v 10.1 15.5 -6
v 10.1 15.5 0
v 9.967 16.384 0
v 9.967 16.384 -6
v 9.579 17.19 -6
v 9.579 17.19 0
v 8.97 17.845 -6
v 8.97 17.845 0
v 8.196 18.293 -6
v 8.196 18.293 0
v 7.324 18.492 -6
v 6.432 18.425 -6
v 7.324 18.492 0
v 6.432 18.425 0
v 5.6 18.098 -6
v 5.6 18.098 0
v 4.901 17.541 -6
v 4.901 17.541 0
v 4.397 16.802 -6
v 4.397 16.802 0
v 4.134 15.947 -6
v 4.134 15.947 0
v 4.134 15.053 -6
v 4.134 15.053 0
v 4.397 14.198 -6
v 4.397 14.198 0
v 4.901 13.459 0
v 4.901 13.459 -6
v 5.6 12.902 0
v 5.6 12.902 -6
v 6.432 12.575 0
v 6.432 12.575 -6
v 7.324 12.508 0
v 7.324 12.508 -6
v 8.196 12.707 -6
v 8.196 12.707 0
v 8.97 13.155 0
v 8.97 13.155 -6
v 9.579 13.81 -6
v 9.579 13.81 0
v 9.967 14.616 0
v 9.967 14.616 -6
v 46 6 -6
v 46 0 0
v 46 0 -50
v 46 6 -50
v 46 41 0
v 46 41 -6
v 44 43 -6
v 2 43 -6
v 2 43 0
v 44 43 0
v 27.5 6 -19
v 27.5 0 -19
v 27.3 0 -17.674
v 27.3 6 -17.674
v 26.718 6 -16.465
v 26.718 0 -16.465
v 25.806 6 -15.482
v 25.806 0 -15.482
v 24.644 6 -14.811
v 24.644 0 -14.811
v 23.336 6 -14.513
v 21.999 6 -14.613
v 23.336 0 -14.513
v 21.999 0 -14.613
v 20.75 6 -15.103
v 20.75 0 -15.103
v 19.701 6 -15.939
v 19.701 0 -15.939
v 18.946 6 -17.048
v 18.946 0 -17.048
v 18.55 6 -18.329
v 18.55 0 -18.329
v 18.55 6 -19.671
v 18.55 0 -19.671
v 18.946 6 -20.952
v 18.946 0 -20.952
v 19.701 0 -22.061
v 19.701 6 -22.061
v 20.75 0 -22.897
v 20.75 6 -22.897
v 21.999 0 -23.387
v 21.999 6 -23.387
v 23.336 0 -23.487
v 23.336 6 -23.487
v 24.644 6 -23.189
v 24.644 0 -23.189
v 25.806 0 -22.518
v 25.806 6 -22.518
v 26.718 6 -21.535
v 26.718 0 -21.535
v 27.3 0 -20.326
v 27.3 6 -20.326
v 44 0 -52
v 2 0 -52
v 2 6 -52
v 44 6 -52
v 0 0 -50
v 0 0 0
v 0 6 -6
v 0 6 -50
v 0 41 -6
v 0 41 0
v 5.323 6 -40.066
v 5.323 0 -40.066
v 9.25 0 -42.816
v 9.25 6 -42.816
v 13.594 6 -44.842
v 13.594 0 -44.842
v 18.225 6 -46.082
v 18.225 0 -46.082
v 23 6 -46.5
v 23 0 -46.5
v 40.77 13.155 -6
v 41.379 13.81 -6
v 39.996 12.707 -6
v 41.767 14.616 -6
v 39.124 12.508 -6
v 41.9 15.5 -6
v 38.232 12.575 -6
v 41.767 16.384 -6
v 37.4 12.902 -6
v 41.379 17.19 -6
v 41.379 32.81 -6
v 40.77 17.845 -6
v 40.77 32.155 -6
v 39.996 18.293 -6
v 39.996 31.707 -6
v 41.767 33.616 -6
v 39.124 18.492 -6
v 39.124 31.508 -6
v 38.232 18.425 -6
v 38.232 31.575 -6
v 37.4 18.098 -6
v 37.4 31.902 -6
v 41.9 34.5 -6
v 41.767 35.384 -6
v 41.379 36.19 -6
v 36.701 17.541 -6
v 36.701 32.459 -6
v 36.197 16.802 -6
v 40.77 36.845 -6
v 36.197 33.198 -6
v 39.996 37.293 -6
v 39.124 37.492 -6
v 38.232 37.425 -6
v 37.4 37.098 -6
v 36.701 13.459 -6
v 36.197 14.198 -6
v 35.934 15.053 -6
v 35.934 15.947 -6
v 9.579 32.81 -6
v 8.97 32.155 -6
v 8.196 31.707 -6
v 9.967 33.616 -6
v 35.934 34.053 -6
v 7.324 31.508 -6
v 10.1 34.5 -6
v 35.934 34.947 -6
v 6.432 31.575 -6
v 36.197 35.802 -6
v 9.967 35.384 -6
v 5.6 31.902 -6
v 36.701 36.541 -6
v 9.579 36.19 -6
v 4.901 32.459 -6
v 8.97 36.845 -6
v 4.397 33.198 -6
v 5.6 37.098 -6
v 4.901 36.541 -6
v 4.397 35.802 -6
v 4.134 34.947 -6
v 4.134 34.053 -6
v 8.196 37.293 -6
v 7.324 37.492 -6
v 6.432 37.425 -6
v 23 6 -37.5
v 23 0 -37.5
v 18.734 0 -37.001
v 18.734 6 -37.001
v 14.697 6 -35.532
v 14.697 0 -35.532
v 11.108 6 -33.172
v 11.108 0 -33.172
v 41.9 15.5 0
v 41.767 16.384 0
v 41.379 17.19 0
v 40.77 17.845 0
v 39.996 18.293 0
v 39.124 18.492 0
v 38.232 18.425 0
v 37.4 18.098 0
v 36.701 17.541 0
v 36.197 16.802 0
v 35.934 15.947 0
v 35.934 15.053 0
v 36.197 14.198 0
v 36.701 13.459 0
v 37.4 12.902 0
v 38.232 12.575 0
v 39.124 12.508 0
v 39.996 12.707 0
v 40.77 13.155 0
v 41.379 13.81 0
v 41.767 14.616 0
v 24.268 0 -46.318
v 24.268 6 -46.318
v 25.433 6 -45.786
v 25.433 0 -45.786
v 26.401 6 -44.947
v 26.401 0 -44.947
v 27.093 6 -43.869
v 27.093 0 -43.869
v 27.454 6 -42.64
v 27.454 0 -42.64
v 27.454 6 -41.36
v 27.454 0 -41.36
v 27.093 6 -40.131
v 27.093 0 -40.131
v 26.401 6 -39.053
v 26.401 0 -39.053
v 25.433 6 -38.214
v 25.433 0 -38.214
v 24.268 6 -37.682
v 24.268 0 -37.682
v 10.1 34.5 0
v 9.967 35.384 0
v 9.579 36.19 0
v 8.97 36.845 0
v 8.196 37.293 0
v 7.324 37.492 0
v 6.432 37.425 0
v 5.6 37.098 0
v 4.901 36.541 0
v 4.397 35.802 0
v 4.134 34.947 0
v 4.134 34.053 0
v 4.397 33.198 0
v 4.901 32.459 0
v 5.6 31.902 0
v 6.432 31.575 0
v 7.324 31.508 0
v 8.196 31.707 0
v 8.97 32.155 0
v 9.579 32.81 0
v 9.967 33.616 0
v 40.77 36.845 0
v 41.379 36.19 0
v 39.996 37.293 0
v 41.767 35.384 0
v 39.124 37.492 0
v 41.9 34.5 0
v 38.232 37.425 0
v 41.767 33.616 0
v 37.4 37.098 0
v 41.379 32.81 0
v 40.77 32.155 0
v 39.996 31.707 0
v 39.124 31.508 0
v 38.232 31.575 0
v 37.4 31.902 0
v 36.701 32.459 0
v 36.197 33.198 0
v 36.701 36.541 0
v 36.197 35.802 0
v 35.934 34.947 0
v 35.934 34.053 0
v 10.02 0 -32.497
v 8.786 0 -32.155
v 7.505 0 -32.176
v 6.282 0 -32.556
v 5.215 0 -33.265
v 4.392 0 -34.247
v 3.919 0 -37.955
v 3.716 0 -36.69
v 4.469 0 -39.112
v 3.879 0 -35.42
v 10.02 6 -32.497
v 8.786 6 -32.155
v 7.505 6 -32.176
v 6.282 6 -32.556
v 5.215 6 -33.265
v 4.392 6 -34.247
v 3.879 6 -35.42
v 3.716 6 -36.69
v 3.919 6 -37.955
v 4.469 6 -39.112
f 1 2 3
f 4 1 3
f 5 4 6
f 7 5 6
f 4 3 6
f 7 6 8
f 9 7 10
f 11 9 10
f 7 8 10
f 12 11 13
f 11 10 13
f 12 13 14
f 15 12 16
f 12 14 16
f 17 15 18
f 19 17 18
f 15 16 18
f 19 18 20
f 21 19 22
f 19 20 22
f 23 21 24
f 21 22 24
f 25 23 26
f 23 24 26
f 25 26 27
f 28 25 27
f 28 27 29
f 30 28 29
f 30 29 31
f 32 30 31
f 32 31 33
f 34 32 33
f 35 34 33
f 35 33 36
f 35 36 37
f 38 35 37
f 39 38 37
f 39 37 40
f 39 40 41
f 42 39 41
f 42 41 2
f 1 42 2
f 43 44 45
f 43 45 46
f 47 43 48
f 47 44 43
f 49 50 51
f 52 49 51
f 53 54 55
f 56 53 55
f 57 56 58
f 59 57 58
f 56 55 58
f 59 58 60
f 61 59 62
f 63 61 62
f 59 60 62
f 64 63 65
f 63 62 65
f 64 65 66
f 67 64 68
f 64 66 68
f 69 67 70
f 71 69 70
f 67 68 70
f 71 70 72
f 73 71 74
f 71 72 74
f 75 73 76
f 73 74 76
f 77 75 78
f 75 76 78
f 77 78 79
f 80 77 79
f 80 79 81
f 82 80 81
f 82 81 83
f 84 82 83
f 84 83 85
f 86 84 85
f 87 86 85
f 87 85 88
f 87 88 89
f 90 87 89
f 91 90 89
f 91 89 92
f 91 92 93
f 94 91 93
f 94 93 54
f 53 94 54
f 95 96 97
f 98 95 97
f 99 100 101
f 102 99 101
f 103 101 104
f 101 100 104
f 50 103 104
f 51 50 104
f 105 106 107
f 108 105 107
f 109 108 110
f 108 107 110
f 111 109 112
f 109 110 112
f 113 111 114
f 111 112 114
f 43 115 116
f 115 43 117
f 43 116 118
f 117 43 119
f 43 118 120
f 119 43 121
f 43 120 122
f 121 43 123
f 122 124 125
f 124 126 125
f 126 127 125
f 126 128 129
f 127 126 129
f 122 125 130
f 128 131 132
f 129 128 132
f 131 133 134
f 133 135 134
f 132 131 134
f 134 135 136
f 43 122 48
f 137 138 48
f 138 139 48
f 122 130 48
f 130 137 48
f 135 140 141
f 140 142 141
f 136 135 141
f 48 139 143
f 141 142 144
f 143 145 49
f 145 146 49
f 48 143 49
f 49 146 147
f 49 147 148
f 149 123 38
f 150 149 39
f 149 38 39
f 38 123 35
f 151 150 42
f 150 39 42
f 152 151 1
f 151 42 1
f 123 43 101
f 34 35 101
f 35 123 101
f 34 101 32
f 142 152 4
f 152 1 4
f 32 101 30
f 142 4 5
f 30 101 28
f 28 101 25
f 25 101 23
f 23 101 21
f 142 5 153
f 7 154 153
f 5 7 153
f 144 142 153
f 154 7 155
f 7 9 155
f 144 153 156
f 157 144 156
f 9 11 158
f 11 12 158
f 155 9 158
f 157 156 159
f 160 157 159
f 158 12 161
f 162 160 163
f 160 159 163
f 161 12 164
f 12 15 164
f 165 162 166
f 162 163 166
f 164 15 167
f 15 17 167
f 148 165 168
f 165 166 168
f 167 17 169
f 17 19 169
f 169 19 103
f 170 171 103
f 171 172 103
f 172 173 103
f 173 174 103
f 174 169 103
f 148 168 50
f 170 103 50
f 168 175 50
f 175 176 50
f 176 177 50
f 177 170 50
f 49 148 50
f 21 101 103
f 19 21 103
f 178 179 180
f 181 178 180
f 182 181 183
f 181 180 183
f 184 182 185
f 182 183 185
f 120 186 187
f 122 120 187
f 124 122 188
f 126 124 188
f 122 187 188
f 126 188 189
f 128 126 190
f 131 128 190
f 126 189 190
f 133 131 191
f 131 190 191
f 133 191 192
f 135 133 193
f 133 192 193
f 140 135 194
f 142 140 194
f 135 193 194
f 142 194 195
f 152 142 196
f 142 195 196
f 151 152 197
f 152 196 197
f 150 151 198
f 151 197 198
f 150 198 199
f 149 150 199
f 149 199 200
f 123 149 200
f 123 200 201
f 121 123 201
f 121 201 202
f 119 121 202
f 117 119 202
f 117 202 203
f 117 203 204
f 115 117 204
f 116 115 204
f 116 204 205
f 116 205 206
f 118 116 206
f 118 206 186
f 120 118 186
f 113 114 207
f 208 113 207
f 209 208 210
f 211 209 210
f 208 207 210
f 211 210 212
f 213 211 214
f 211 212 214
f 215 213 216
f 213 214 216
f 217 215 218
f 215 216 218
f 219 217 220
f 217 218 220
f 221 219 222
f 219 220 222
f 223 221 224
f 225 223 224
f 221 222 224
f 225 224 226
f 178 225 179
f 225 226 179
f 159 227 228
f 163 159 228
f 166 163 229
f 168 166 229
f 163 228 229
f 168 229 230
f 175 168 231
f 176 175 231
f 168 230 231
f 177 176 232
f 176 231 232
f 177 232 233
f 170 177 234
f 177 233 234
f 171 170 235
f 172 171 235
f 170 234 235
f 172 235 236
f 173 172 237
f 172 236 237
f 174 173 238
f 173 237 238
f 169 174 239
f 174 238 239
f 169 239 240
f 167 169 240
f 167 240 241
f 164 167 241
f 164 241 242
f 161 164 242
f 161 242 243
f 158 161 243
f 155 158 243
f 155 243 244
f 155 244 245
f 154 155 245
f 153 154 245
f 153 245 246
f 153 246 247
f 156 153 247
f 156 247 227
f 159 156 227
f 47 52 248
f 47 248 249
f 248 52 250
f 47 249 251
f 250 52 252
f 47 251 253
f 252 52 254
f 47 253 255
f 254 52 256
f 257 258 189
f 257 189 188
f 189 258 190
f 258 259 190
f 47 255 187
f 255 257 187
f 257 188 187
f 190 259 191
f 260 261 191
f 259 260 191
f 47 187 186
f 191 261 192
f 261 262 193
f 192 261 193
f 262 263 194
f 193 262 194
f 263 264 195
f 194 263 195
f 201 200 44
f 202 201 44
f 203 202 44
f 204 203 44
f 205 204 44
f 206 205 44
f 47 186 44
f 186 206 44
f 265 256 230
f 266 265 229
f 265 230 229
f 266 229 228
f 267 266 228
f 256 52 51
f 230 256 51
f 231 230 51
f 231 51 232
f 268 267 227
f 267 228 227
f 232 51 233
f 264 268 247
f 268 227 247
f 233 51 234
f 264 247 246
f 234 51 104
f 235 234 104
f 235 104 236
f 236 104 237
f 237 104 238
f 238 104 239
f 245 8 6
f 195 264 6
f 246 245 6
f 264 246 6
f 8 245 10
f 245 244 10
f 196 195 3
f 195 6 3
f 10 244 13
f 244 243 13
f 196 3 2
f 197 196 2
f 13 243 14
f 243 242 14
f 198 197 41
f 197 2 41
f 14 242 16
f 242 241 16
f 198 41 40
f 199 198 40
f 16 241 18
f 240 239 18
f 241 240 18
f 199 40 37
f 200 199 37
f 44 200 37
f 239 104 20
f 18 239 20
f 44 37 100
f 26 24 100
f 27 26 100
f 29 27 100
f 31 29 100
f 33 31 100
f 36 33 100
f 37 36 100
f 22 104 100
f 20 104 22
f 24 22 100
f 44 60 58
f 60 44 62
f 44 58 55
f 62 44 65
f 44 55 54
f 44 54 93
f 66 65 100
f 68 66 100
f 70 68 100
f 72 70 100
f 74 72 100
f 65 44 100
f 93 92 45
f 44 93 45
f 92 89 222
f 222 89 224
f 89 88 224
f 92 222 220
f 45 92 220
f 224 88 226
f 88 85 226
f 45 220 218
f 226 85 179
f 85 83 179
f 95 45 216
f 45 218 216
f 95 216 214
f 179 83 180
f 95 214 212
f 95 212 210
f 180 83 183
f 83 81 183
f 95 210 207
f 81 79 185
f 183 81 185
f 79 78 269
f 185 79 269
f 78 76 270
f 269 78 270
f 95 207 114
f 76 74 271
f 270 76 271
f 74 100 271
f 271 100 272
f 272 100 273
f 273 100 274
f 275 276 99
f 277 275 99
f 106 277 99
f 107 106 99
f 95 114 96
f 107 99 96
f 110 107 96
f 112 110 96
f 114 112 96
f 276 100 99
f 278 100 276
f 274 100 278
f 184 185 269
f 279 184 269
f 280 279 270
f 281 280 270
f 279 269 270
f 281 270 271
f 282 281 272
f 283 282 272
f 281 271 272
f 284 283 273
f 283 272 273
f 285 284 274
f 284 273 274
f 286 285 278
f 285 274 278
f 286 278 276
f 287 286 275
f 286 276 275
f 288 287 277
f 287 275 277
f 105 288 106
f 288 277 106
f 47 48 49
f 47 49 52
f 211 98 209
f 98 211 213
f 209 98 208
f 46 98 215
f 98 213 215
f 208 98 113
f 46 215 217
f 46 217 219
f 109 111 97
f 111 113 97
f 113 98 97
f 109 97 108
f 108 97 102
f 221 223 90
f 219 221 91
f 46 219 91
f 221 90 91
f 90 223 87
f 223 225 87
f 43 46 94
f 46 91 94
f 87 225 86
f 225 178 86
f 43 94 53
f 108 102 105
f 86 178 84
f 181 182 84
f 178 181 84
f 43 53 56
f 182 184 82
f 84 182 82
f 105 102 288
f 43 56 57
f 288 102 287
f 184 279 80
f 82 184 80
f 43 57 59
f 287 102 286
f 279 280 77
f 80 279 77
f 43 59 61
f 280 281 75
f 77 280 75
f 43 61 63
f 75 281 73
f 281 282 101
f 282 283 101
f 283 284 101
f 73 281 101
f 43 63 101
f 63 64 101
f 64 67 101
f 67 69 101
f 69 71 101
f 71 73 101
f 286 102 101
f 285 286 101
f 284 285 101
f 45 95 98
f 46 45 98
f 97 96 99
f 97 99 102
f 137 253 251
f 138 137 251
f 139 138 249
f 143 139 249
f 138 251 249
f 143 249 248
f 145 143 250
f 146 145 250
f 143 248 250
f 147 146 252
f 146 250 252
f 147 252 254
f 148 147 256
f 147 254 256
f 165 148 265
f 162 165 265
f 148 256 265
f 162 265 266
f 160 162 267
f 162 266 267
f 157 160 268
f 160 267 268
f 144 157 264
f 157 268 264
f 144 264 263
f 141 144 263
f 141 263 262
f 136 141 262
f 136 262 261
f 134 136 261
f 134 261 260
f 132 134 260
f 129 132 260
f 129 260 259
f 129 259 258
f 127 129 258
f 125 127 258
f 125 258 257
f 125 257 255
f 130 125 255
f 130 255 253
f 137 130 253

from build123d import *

# Parameters (mm, degrees)
F1_DEPTH = 46
F2_R     = 3
F3_DEPTH = 25
F4_R     = 4.5
F5_DEPTH = 25
F6_SIZE  = 2


with BuildPart() as f1:
    # F0 (on Right) → F1 (new body)
    with BuildSketch(Plane.YZ):
        Polygon((43, 0), (0, 0), (0, -52), (6, -52), (6, -6), (43, -6), align=None)
    extrude(amount=F1_DEPTH)

    # F2 (on Top) → F3 (cut)
    with BuildSketch(Plane.XY):
        with Locations((38.9, 15.5)):
            Circle(F2_R)
        with Locations((38.9, 34.5)):
            Circle(F2_R)
        with Locations((7.1, 15.5)):
            Circle(F2_R)
        with Locations((7.1, 34.5)):
            Circle(F2_R)
    extrude(amount=-F3_DEPTH, mode=Mode.SUBTRACT)

    # F4 (on face) → F5 (cut)
    with BuildSketch(Plane.XZ):
        with Locations((23, -19)):
            Circle(F4_R)
        with BuildLine():
            ThreePointArc((23, -37.5), (16.672627, -36.384313), (11.108429, -33.171822))
            ThreePointArc((11.108429, -33.171822), (4.768685, -33.726478), (5.323341, -40.066222))
            ThreePointArc((5.323341, -40.066222), (13.594446, -44.841547), (23, -46.5))
            ThreePointArc((23, -46.5), (27.5, -42), (23, -37.5))
        make_face()
    extrude(amount=-F5_DEPTH, mode=Mode.SUBTRACT)

    # F6
    f6_edges = [f1.edges().sort_by_distance(p)[0] for p in [
        (0, 43, -3),
        (46, 43, -3),
        (46, 3, -52),
        (0, 3, -52),
    ]]
    chamfer(f6_edges, length=F6_SIZE)


solid = f1.part
